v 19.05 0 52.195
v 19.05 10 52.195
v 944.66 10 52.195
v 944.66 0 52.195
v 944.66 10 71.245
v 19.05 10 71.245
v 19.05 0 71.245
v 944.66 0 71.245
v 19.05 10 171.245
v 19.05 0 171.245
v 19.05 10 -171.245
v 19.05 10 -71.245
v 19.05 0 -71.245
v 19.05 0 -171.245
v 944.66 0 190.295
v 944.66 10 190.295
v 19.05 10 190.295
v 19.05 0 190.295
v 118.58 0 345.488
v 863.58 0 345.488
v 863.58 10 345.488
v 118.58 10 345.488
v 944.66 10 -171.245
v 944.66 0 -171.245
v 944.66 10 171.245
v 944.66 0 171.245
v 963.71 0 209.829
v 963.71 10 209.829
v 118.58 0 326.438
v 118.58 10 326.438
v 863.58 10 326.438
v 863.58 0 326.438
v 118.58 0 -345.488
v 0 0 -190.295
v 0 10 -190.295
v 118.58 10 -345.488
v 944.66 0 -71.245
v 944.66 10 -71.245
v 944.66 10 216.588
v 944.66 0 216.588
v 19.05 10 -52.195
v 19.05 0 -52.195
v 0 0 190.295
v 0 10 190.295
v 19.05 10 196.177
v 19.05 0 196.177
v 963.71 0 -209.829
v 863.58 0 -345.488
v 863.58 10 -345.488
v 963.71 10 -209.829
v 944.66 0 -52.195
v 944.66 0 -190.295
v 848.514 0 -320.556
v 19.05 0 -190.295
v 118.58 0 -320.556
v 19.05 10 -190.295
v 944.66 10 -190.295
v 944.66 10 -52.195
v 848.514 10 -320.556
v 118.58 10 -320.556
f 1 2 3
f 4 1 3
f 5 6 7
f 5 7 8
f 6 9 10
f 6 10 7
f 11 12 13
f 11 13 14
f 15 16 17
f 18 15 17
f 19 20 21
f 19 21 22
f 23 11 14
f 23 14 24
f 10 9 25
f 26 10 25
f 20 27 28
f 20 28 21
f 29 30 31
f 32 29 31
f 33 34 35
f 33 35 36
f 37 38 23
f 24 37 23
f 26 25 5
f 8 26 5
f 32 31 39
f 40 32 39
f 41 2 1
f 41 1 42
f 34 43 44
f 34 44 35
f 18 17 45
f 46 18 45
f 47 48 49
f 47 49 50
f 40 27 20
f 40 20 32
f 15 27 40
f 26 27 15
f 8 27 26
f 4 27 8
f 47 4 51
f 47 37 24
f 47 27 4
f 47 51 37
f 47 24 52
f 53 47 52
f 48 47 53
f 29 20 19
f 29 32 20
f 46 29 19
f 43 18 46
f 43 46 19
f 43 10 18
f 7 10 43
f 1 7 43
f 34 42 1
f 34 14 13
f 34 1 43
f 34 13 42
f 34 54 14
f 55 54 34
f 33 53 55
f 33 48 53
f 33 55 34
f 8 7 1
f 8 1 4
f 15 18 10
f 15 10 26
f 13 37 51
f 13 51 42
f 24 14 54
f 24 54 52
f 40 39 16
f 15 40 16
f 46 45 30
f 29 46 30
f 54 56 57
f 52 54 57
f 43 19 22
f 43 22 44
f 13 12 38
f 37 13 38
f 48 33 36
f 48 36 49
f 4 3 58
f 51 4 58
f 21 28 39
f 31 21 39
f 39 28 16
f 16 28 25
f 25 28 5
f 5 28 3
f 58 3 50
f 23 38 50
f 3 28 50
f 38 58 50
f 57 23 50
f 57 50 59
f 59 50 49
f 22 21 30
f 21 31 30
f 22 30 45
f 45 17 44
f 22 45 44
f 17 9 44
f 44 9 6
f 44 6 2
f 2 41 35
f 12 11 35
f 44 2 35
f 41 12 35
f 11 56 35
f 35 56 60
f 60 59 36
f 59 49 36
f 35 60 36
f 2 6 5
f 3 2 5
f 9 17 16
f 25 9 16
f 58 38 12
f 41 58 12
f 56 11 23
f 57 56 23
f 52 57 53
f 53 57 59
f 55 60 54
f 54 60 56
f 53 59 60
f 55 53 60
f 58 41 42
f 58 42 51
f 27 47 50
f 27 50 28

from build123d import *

# Parameters (mm, degrees)
BOSS_EXTRUDE1_DEPTH = 10
CUT_EXTRUDE1_DEPTH  = 10
BOSS_EXTRUDE3_START = -20
SKETCH7_W           = 80
SKETCH7_H           = 80
BOSS_EXTRUDE3_DEPTH = 30
SKETCH8_W           = 925.61
SKETCH8_H           = 100
SKETCH8_H_2         = 104.39
SKETCH8_W_2         = 80
SKETCH8_H_3         = 80
CUT_EXTRUDE6_DEPTH  = 10


with BuildPart() as part:
    # Sketch2 → Boss-Extrude1 (new body)
    with BuildSketch(Plane(origin=(0, 0, 0), x_dir=(1, 0, 0), z_dir=(0, 1, 0))):
        Polygon((118.58, 345.487717935), (863.58, 345.487717935), (963.71, 209.828898833), (963.71, -209.828898833), (863.58, -345.487717935), (118.58, -345.487717935), (0, -190.295), (0, 190.295), align=None)
    extrude(amount=BOSS_EXTRUDE1_DEPTH)

    # Sketch3 → Cut-Extrude1 (cut)
    with BuildSketch(Plane(origin=(0, 10, 0), x_dir=(1, 0, 0), z_dir=(0, 1, 0))):
        with BuildLine():
            Line((340, -245.487717935), (340, -279.772016162))
            Line((340, -279.772016162), (341.671796469, -281.959995904))
            ThreePointArc((341.671796469, -281.959995904), (371.660256421, -306.647976918), (409.484364019, -315.487717935))
            Line((409.484364019, -315.487717935), (542.385502063, -315.487717935))
            Line((542.385502063, -315.487717935), (542.385502063, -245.487717935))
            Line((542.385502063, -245.487717935), (340, -245.487717935))
        make_face()
    cut_extrude1 = extrude(amount=-CUT_EXTRUDE1_DEPTH, mode=Mode.SUBTRACT)

    # Sketch7 → Boss-Extrude3 (add)
    with BuildSketch(Plane(origin=(0, 10, 0), x_dir=(1, 0, 0), z_dir=(0, 1, 0)).offset(BOSS_EXTRUDE3_START)):
        with Locations((89.309431631, -0.676064103)):
            Rectangle(SKETCH7_W, SKETCH7_H)
    boss_extrude3 = extrude(amount=BOSS_EXTRUDE3_DEPTH)

    # Mirror2: Boss-Extrude3 across plane
    add(boss_extrude3.mirror(Plane.ZY.offset(-481.855)))

    # Mirror3: Cut-Extrude1 across plane
    add(cut_extrude1.mirror(Plane.XY), mode=Mode.SUBTRACT)

    # Sketch8 → Cut-Extrude6 (cut)
    with BuildSketch(Plane(origin=(0, 10, 0), x_dir=(1, 0, 0), z_dir=(0, 1, 0))):
        Polygon((848.514252318, 320.555846821), (118.58, 320.555846821), (19.05, 190.295), (944.66, 190.295), align=None)
        with BuildLine():
            Line((409.484364019, 315.487717935), (542.385502063, 315.487717935))
            Line((542.385502063, 315.487717935), (542.385502063, 245.487717935))
            Line((542.385502063, 245.487717935), (340, 245.487717935))
            Line((340, 245.487717935), (340, 279.772016162))
            Line((340, 279.772016162), (341.671796469, 281.959995904))
            ThreePointArc((341.671796469, 281.959995904), (371.660256421, 306.647976918), (409.484364019, 315.487717935))
        make_face(mode=Mode.SUBTRACT)
        with Locations((481.855, 121.245)):
            Rectangle(SKETCH8_W, SKETCH8_H)
        with Locations((481.855, 0)):
            Rectangle(SKETCH8_W, SKETCH8_H_2)
        with Locations((89.309431631, -0.676064103)):
            Rectangle(SKETCH8_W_2, SKETCH8_H_3, mode=Mode.SUBTRACT)
        with Locations((874.400568369, -0.676064103)):
            Rectangle(SKETCH8_W_2, SKETCH8_H_3, mode=Mode.SUBTRACT)
        with Locations((481.855, -121.245)):
            Rectangle(SKETCH8_W, SKETCH8_H)
        Polygon((944.66, -190.295), (19.05, -190.295), (19.05, -196.176871114), (118.58, -326.437717935), (863.58, -326.437717935), (944.66, -216.588351584), align=None)
        with BuildLine():
            Line((340, -279.772016162), (340, -245.487717935))
            Line((340, -245.487717935), (542.385502063, -245.487717935))
            Line((542.385502063, -245.487717935), (542.385502063, -315.487717935))
            Line((542.385502063, -315.487717935), (409.484364019, -315.487717935))
            ThreePointArc((409.484364019, -315.487717935), (371.660256421, -306.647976918), (341.671796469, -281.959995904))
            Line((341.671796469, -281.959995904), (340, -279.772016162))
        make_face(mode=Mode.SUBTRACT)
    extrude(amount=-CUT_EXTRUDE6_DEPTH, mode=Mode.SUBTRACT)


with BuildPart() as body_2:
    # of the pieces the cut leaves, the one that is kept (cut_extrude6_keep)
    add(part.part.solids().sort_by_distance((118.58, 0, -345.487717935))[0])


solid = body_2.part
